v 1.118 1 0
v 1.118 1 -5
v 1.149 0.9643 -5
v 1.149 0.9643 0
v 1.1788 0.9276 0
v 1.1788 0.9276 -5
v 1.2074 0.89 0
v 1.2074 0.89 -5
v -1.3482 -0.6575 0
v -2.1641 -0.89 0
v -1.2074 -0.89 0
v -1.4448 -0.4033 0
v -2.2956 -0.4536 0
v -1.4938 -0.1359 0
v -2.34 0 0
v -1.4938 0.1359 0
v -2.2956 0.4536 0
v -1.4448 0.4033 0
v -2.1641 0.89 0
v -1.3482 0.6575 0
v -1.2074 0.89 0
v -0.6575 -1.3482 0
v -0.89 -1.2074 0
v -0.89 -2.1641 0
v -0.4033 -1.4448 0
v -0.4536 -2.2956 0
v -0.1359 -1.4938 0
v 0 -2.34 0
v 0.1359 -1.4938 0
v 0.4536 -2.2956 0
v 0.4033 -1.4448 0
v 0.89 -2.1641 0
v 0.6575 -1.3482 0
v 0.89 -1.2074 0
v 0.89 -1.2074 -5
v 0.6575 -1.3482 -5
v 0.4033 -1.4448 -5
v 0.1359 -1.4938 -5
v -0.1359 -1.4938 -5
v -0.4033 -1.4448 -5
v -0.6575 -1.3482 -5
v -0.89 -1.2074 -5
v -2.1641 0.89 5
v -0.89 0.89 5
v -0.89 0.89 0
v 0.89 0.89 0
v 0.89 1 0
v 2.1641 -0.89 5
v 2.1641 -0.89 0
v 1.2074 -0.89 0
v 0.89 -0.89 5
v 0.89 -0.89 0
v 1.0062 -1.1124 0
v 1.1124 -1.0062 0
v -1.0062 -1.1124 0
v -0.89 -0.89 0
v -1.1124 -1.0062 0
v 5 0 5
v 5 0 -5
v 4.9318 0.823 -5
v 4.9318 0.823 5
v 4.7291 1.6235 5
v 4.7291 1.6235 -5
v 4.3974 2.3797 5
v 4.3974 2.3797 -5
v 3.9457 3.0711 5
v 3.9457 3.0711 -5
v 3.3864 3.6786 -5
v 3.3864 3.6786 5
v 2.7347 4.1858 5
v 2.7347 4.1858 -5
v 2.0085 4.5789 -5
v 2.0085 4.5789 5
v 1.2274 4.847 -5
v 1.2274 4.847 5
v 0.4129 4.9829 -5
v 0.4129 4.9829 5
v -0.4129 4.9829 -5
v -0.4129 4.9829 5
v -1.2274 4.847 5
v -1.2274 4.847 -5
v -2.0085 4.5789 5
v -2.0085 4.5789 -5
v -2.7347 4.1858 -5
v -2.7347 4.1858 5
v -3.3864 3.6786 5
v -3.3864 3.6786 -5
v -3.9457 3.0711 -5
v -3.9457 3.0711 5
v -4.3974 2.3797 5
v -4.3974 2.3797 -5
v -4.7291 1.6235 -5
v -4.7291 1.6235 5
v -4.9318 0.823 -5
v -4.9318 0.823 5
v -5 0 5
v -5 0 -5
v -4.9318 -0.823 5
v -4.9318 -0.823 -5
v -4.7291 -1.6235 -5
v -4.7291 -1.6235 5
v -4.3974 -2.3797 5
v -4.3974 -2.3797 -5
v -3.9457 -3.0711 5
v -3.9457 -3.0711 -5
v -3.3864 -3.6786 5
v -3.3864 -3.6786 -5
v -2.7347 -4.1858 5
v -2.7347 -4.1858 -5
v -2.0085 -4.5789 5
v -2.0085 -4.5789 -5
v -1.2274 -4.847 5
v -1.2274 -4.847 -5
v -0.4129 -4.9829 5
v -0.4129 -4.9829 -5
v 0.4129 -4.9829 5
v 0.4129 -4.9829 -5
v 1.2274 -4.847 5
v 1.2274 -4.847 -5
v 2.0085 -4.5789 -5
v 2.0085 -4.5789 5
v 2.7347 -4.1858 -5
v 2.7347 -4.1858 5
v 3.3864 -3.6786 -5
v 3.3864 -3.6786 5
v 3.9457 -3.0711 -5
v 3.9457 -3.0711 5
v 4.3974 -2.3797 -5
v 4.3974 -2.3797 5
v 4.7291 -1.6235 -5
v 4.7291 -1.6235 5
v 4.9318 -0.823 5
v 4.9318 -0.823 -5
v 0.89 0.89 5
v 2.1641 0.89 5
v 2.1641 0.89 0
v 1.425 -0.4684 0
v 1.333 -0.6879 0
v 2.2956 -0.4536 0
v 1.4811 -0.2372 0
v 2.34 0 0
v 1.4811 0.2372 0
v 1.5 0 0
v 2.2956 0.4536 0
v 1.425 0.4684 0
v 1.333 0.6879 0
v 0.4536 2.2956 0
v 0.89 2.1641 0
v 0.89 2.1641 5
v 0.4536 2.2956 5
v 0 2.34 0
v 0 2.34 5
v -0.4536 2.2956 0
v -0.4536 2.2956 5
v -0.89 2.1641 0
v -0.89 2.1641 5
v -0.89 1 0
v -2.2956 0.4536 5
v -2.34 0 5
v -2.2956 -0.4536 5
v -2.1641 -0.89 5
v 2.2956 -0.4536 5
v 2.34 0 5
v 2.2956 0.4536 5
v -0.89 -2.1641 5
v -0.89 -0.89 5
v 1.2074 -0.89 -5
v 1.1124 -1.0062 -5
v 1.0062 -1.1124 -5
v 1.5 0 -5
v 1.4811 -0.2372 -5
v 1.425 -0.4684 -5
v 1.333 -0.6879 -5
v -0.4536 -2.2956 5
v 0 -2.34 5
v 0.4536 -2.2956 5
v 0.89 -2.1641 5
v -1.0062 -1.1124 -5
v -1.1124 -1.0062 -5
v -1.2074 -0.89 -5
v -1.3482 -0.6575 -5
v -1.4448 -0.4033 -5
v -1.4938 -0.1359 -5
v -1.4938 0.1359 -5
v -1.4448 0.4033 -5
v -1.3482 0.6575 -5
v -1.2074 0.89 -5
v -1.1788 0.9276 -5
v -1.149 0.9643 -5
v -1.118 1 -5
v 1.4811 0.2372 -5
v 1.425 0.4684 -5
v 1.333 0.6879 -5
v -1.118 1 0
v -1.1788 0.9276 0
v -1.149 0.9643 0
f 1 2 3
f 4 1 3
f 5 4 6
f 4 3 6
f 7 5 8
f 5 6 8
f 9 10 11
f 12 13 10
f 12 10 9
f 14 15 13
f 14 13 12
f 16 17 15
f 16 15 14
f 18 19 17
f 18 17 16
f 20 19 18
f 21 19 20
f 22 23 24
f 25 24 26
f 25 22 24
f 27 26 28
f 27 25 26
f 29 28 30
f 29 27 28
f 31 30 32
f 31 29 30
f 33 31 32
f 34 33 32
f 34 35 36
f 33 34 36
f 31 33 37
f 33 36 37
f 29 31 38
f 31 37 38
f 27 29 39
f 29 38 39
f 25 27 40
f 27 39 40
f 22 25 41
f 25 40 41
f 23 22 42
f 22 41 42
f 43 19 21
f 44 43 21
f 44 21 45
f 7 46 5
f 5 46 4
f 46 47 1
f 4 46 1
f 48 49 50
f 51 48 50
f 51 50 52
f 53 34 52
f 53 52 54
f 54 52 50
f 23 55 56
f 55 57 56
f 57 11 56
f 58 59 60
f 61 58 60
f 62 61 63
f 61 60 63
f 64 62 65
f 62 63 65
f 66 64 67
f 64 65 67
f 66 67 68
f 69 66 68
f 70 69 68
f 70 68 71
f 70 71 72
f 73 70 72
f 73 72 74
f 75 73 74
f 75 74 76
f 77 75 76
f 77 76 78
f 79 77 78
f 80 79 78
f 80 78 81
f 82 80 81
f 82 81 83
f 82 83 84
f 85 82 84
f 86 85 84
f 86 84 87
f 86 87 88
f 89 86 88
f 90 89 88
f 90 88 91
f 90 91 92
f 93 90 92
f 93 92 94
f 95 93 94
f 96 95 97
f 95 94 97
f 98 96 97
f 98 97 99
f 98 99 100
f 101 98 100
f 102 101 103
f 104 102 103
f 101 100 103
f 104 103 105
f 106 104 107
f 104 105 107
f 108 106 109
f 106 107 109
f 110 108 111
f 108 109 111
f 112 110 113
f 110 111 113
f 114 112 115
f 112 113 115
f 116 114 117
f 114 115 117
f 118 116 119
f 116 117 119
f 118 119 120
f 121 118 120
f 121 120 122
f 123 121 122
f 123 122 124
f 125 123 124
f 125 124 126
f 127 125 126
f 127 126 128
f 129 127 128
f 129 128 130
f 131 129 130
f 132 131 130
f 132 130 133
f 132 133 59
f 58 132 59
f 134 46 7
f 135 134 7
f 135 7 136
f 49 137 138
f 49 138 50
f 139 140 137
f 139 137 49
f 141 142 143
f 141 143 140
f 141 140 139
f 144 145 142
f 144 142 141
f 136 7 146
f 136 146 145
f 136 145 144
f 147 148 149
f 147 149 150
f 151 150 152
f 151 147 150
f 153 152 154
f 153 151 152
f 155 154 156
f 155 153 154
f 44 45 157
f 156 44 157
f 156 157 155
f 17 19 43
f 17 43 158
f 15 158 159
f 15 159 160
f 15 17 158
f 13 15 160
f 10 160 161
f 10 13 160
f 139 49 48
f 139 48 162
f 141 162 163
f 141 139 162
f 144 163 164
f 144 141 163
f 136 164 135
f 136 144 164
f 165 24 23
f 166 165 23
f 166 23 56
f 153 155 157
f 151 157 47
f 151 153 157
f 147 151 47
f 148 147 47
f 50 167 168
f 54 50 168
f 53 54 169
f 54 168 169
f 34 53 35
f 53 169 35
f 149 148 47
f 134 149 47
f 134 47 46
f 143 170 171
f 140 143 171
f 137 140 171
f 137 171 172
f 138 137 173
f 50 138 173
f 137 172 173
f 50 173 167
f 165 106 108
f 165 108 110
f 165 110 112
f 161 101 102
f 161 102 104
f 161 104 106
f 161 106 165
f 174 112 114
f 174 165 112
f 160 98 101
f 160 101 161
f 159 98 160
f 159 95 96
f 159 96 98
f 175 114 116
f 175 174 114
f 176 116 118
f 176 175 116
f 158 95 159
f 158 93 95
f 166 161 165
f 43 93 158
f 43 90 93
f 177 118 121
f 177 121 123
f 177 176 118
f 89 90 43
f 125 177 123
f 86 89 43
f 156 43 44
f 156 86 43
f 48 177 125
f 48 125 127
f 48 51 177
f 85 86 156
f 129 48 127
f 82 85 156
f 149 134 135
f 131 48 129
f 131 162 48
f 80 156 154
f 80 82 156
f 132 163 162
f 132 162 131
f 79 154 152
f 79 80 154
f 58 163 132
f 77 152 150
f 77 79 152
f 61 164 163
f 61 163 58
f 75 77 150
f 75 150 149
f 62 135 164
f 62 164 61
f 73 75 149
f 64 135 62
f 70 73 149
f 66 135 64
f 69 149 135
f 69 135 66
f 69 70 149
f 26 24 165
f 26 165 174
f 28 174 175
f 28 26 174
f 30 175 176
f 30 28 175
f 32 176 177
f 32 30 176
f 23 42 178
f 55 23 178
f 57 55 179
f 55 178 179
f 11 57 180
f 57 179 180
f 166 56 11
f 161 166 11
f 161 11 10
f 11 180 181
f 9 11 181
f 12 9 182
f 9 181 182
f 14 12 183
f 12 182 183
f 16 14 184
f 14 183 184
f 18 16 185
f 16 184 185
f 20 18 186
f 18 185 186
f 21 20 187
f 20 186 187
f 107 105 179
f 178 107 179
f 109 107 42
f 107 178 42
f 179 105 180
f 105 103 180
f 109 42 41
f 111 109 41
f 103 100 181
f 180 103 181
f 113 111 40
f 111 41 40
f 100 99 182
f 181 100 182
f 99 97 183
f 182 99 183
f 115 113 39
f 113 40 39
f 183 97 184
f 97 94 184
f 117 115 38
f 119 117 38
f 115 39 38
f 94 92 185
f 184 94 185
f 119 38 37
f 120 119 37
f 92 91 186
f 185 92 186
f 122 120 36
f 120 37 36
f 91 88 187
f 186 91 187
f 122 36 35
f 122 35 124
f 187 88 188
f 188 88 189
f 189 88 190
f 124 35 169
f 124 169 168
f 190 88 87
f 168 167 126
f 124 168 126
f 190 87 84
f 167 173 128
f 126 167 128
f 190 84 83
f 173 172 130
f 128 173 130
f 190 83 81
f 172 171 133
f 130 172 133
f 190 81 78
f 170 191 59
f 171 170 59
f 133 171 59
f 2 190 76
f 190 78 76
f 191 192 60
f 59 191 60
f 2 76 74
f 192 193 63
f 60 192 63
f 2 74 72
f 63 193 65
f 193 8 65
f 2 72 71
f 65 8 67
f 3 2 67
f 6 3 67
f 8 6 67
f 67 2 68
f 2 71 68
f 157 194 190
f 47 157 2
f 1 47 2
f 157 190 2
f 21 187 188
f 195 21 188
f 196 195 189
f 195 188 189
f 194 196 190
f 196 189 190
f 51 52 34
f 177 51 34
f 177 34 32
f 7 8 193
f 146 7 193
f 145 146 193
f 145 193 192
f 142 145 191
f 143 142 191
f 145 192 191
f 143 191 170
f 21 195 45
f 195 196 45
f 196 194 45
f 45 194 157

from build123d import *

# Parameters (mm, degrees)
SKETCH1_R           = 5
BOSS_EXTRUDE1_DEPTH = 5
BOSS_EXTRUDE2_START = -5
SKETCH1_3_R         = 5
BOSS_EXTRUDE2_DEPTH = 5


with BuildPart() as part:
    # Sketch1 → Boss-Extrude1 (new body)
    with BuildSketch(Plane.XY):
        Circle(SKETCH1_R)
        with BuildLine():
            ThreePointArc((-0.89, 2.164139552), (0, 2.34), (0.89, 2.164139552))
            Line((0.89, 2.164139552), (0.89, 0.89))
            Line((0.89, 0.89), (2.164139552, 0.89))
            ThreePointArc((2.164139552, 0.89), (2.34, 0), (2.164139552, -0.89))
            Line((2.164139552, -0.89), (0.89, -0.89))
            Line((0.89, -0.89), (0.89, -2.164139552))
            ThreePointArc((0.89, -2.164139552), (0, -2.34), (-0.89, -2.164139552))
            Line((-0.89, -2.164139552), (-0.89, -0.89))
            Line((-0.89, -0.89), (-2.164139552, -0.89))
            ThreePointArc((-2.164139552, -0.89), (-2.34, 0), (-2.164139552, 0.89))
            Line((-2.164139552, 0.89), (-0.89, 0.89))
            Line((-0.89, 0.89), (-0.89, 2.164139552))
        make_face(mode=Mode.SUBTRACT)
    extrude(amount=BOSS_EXTRUDE1_DEPTH)

    # Sketch1<3> → Boss-Extrude2 (add)
    with BuildSketch(Plane.XY.offset(BOSS_EXTRUDE2_START)):
        Circle(SKETCH1_3_R)
        with BuildLine():
            ThreePointArc((1.118033989, 1), (0, -1.5), (-1.118033989, 1))
            Line((-1.118033989, 1), (1.118033989, 1))
        make_face(mode=Mode.SUBTRACT)
    extrude(amount=BOSS_EXTRUDE2_DEPTH)


solid = part.part
